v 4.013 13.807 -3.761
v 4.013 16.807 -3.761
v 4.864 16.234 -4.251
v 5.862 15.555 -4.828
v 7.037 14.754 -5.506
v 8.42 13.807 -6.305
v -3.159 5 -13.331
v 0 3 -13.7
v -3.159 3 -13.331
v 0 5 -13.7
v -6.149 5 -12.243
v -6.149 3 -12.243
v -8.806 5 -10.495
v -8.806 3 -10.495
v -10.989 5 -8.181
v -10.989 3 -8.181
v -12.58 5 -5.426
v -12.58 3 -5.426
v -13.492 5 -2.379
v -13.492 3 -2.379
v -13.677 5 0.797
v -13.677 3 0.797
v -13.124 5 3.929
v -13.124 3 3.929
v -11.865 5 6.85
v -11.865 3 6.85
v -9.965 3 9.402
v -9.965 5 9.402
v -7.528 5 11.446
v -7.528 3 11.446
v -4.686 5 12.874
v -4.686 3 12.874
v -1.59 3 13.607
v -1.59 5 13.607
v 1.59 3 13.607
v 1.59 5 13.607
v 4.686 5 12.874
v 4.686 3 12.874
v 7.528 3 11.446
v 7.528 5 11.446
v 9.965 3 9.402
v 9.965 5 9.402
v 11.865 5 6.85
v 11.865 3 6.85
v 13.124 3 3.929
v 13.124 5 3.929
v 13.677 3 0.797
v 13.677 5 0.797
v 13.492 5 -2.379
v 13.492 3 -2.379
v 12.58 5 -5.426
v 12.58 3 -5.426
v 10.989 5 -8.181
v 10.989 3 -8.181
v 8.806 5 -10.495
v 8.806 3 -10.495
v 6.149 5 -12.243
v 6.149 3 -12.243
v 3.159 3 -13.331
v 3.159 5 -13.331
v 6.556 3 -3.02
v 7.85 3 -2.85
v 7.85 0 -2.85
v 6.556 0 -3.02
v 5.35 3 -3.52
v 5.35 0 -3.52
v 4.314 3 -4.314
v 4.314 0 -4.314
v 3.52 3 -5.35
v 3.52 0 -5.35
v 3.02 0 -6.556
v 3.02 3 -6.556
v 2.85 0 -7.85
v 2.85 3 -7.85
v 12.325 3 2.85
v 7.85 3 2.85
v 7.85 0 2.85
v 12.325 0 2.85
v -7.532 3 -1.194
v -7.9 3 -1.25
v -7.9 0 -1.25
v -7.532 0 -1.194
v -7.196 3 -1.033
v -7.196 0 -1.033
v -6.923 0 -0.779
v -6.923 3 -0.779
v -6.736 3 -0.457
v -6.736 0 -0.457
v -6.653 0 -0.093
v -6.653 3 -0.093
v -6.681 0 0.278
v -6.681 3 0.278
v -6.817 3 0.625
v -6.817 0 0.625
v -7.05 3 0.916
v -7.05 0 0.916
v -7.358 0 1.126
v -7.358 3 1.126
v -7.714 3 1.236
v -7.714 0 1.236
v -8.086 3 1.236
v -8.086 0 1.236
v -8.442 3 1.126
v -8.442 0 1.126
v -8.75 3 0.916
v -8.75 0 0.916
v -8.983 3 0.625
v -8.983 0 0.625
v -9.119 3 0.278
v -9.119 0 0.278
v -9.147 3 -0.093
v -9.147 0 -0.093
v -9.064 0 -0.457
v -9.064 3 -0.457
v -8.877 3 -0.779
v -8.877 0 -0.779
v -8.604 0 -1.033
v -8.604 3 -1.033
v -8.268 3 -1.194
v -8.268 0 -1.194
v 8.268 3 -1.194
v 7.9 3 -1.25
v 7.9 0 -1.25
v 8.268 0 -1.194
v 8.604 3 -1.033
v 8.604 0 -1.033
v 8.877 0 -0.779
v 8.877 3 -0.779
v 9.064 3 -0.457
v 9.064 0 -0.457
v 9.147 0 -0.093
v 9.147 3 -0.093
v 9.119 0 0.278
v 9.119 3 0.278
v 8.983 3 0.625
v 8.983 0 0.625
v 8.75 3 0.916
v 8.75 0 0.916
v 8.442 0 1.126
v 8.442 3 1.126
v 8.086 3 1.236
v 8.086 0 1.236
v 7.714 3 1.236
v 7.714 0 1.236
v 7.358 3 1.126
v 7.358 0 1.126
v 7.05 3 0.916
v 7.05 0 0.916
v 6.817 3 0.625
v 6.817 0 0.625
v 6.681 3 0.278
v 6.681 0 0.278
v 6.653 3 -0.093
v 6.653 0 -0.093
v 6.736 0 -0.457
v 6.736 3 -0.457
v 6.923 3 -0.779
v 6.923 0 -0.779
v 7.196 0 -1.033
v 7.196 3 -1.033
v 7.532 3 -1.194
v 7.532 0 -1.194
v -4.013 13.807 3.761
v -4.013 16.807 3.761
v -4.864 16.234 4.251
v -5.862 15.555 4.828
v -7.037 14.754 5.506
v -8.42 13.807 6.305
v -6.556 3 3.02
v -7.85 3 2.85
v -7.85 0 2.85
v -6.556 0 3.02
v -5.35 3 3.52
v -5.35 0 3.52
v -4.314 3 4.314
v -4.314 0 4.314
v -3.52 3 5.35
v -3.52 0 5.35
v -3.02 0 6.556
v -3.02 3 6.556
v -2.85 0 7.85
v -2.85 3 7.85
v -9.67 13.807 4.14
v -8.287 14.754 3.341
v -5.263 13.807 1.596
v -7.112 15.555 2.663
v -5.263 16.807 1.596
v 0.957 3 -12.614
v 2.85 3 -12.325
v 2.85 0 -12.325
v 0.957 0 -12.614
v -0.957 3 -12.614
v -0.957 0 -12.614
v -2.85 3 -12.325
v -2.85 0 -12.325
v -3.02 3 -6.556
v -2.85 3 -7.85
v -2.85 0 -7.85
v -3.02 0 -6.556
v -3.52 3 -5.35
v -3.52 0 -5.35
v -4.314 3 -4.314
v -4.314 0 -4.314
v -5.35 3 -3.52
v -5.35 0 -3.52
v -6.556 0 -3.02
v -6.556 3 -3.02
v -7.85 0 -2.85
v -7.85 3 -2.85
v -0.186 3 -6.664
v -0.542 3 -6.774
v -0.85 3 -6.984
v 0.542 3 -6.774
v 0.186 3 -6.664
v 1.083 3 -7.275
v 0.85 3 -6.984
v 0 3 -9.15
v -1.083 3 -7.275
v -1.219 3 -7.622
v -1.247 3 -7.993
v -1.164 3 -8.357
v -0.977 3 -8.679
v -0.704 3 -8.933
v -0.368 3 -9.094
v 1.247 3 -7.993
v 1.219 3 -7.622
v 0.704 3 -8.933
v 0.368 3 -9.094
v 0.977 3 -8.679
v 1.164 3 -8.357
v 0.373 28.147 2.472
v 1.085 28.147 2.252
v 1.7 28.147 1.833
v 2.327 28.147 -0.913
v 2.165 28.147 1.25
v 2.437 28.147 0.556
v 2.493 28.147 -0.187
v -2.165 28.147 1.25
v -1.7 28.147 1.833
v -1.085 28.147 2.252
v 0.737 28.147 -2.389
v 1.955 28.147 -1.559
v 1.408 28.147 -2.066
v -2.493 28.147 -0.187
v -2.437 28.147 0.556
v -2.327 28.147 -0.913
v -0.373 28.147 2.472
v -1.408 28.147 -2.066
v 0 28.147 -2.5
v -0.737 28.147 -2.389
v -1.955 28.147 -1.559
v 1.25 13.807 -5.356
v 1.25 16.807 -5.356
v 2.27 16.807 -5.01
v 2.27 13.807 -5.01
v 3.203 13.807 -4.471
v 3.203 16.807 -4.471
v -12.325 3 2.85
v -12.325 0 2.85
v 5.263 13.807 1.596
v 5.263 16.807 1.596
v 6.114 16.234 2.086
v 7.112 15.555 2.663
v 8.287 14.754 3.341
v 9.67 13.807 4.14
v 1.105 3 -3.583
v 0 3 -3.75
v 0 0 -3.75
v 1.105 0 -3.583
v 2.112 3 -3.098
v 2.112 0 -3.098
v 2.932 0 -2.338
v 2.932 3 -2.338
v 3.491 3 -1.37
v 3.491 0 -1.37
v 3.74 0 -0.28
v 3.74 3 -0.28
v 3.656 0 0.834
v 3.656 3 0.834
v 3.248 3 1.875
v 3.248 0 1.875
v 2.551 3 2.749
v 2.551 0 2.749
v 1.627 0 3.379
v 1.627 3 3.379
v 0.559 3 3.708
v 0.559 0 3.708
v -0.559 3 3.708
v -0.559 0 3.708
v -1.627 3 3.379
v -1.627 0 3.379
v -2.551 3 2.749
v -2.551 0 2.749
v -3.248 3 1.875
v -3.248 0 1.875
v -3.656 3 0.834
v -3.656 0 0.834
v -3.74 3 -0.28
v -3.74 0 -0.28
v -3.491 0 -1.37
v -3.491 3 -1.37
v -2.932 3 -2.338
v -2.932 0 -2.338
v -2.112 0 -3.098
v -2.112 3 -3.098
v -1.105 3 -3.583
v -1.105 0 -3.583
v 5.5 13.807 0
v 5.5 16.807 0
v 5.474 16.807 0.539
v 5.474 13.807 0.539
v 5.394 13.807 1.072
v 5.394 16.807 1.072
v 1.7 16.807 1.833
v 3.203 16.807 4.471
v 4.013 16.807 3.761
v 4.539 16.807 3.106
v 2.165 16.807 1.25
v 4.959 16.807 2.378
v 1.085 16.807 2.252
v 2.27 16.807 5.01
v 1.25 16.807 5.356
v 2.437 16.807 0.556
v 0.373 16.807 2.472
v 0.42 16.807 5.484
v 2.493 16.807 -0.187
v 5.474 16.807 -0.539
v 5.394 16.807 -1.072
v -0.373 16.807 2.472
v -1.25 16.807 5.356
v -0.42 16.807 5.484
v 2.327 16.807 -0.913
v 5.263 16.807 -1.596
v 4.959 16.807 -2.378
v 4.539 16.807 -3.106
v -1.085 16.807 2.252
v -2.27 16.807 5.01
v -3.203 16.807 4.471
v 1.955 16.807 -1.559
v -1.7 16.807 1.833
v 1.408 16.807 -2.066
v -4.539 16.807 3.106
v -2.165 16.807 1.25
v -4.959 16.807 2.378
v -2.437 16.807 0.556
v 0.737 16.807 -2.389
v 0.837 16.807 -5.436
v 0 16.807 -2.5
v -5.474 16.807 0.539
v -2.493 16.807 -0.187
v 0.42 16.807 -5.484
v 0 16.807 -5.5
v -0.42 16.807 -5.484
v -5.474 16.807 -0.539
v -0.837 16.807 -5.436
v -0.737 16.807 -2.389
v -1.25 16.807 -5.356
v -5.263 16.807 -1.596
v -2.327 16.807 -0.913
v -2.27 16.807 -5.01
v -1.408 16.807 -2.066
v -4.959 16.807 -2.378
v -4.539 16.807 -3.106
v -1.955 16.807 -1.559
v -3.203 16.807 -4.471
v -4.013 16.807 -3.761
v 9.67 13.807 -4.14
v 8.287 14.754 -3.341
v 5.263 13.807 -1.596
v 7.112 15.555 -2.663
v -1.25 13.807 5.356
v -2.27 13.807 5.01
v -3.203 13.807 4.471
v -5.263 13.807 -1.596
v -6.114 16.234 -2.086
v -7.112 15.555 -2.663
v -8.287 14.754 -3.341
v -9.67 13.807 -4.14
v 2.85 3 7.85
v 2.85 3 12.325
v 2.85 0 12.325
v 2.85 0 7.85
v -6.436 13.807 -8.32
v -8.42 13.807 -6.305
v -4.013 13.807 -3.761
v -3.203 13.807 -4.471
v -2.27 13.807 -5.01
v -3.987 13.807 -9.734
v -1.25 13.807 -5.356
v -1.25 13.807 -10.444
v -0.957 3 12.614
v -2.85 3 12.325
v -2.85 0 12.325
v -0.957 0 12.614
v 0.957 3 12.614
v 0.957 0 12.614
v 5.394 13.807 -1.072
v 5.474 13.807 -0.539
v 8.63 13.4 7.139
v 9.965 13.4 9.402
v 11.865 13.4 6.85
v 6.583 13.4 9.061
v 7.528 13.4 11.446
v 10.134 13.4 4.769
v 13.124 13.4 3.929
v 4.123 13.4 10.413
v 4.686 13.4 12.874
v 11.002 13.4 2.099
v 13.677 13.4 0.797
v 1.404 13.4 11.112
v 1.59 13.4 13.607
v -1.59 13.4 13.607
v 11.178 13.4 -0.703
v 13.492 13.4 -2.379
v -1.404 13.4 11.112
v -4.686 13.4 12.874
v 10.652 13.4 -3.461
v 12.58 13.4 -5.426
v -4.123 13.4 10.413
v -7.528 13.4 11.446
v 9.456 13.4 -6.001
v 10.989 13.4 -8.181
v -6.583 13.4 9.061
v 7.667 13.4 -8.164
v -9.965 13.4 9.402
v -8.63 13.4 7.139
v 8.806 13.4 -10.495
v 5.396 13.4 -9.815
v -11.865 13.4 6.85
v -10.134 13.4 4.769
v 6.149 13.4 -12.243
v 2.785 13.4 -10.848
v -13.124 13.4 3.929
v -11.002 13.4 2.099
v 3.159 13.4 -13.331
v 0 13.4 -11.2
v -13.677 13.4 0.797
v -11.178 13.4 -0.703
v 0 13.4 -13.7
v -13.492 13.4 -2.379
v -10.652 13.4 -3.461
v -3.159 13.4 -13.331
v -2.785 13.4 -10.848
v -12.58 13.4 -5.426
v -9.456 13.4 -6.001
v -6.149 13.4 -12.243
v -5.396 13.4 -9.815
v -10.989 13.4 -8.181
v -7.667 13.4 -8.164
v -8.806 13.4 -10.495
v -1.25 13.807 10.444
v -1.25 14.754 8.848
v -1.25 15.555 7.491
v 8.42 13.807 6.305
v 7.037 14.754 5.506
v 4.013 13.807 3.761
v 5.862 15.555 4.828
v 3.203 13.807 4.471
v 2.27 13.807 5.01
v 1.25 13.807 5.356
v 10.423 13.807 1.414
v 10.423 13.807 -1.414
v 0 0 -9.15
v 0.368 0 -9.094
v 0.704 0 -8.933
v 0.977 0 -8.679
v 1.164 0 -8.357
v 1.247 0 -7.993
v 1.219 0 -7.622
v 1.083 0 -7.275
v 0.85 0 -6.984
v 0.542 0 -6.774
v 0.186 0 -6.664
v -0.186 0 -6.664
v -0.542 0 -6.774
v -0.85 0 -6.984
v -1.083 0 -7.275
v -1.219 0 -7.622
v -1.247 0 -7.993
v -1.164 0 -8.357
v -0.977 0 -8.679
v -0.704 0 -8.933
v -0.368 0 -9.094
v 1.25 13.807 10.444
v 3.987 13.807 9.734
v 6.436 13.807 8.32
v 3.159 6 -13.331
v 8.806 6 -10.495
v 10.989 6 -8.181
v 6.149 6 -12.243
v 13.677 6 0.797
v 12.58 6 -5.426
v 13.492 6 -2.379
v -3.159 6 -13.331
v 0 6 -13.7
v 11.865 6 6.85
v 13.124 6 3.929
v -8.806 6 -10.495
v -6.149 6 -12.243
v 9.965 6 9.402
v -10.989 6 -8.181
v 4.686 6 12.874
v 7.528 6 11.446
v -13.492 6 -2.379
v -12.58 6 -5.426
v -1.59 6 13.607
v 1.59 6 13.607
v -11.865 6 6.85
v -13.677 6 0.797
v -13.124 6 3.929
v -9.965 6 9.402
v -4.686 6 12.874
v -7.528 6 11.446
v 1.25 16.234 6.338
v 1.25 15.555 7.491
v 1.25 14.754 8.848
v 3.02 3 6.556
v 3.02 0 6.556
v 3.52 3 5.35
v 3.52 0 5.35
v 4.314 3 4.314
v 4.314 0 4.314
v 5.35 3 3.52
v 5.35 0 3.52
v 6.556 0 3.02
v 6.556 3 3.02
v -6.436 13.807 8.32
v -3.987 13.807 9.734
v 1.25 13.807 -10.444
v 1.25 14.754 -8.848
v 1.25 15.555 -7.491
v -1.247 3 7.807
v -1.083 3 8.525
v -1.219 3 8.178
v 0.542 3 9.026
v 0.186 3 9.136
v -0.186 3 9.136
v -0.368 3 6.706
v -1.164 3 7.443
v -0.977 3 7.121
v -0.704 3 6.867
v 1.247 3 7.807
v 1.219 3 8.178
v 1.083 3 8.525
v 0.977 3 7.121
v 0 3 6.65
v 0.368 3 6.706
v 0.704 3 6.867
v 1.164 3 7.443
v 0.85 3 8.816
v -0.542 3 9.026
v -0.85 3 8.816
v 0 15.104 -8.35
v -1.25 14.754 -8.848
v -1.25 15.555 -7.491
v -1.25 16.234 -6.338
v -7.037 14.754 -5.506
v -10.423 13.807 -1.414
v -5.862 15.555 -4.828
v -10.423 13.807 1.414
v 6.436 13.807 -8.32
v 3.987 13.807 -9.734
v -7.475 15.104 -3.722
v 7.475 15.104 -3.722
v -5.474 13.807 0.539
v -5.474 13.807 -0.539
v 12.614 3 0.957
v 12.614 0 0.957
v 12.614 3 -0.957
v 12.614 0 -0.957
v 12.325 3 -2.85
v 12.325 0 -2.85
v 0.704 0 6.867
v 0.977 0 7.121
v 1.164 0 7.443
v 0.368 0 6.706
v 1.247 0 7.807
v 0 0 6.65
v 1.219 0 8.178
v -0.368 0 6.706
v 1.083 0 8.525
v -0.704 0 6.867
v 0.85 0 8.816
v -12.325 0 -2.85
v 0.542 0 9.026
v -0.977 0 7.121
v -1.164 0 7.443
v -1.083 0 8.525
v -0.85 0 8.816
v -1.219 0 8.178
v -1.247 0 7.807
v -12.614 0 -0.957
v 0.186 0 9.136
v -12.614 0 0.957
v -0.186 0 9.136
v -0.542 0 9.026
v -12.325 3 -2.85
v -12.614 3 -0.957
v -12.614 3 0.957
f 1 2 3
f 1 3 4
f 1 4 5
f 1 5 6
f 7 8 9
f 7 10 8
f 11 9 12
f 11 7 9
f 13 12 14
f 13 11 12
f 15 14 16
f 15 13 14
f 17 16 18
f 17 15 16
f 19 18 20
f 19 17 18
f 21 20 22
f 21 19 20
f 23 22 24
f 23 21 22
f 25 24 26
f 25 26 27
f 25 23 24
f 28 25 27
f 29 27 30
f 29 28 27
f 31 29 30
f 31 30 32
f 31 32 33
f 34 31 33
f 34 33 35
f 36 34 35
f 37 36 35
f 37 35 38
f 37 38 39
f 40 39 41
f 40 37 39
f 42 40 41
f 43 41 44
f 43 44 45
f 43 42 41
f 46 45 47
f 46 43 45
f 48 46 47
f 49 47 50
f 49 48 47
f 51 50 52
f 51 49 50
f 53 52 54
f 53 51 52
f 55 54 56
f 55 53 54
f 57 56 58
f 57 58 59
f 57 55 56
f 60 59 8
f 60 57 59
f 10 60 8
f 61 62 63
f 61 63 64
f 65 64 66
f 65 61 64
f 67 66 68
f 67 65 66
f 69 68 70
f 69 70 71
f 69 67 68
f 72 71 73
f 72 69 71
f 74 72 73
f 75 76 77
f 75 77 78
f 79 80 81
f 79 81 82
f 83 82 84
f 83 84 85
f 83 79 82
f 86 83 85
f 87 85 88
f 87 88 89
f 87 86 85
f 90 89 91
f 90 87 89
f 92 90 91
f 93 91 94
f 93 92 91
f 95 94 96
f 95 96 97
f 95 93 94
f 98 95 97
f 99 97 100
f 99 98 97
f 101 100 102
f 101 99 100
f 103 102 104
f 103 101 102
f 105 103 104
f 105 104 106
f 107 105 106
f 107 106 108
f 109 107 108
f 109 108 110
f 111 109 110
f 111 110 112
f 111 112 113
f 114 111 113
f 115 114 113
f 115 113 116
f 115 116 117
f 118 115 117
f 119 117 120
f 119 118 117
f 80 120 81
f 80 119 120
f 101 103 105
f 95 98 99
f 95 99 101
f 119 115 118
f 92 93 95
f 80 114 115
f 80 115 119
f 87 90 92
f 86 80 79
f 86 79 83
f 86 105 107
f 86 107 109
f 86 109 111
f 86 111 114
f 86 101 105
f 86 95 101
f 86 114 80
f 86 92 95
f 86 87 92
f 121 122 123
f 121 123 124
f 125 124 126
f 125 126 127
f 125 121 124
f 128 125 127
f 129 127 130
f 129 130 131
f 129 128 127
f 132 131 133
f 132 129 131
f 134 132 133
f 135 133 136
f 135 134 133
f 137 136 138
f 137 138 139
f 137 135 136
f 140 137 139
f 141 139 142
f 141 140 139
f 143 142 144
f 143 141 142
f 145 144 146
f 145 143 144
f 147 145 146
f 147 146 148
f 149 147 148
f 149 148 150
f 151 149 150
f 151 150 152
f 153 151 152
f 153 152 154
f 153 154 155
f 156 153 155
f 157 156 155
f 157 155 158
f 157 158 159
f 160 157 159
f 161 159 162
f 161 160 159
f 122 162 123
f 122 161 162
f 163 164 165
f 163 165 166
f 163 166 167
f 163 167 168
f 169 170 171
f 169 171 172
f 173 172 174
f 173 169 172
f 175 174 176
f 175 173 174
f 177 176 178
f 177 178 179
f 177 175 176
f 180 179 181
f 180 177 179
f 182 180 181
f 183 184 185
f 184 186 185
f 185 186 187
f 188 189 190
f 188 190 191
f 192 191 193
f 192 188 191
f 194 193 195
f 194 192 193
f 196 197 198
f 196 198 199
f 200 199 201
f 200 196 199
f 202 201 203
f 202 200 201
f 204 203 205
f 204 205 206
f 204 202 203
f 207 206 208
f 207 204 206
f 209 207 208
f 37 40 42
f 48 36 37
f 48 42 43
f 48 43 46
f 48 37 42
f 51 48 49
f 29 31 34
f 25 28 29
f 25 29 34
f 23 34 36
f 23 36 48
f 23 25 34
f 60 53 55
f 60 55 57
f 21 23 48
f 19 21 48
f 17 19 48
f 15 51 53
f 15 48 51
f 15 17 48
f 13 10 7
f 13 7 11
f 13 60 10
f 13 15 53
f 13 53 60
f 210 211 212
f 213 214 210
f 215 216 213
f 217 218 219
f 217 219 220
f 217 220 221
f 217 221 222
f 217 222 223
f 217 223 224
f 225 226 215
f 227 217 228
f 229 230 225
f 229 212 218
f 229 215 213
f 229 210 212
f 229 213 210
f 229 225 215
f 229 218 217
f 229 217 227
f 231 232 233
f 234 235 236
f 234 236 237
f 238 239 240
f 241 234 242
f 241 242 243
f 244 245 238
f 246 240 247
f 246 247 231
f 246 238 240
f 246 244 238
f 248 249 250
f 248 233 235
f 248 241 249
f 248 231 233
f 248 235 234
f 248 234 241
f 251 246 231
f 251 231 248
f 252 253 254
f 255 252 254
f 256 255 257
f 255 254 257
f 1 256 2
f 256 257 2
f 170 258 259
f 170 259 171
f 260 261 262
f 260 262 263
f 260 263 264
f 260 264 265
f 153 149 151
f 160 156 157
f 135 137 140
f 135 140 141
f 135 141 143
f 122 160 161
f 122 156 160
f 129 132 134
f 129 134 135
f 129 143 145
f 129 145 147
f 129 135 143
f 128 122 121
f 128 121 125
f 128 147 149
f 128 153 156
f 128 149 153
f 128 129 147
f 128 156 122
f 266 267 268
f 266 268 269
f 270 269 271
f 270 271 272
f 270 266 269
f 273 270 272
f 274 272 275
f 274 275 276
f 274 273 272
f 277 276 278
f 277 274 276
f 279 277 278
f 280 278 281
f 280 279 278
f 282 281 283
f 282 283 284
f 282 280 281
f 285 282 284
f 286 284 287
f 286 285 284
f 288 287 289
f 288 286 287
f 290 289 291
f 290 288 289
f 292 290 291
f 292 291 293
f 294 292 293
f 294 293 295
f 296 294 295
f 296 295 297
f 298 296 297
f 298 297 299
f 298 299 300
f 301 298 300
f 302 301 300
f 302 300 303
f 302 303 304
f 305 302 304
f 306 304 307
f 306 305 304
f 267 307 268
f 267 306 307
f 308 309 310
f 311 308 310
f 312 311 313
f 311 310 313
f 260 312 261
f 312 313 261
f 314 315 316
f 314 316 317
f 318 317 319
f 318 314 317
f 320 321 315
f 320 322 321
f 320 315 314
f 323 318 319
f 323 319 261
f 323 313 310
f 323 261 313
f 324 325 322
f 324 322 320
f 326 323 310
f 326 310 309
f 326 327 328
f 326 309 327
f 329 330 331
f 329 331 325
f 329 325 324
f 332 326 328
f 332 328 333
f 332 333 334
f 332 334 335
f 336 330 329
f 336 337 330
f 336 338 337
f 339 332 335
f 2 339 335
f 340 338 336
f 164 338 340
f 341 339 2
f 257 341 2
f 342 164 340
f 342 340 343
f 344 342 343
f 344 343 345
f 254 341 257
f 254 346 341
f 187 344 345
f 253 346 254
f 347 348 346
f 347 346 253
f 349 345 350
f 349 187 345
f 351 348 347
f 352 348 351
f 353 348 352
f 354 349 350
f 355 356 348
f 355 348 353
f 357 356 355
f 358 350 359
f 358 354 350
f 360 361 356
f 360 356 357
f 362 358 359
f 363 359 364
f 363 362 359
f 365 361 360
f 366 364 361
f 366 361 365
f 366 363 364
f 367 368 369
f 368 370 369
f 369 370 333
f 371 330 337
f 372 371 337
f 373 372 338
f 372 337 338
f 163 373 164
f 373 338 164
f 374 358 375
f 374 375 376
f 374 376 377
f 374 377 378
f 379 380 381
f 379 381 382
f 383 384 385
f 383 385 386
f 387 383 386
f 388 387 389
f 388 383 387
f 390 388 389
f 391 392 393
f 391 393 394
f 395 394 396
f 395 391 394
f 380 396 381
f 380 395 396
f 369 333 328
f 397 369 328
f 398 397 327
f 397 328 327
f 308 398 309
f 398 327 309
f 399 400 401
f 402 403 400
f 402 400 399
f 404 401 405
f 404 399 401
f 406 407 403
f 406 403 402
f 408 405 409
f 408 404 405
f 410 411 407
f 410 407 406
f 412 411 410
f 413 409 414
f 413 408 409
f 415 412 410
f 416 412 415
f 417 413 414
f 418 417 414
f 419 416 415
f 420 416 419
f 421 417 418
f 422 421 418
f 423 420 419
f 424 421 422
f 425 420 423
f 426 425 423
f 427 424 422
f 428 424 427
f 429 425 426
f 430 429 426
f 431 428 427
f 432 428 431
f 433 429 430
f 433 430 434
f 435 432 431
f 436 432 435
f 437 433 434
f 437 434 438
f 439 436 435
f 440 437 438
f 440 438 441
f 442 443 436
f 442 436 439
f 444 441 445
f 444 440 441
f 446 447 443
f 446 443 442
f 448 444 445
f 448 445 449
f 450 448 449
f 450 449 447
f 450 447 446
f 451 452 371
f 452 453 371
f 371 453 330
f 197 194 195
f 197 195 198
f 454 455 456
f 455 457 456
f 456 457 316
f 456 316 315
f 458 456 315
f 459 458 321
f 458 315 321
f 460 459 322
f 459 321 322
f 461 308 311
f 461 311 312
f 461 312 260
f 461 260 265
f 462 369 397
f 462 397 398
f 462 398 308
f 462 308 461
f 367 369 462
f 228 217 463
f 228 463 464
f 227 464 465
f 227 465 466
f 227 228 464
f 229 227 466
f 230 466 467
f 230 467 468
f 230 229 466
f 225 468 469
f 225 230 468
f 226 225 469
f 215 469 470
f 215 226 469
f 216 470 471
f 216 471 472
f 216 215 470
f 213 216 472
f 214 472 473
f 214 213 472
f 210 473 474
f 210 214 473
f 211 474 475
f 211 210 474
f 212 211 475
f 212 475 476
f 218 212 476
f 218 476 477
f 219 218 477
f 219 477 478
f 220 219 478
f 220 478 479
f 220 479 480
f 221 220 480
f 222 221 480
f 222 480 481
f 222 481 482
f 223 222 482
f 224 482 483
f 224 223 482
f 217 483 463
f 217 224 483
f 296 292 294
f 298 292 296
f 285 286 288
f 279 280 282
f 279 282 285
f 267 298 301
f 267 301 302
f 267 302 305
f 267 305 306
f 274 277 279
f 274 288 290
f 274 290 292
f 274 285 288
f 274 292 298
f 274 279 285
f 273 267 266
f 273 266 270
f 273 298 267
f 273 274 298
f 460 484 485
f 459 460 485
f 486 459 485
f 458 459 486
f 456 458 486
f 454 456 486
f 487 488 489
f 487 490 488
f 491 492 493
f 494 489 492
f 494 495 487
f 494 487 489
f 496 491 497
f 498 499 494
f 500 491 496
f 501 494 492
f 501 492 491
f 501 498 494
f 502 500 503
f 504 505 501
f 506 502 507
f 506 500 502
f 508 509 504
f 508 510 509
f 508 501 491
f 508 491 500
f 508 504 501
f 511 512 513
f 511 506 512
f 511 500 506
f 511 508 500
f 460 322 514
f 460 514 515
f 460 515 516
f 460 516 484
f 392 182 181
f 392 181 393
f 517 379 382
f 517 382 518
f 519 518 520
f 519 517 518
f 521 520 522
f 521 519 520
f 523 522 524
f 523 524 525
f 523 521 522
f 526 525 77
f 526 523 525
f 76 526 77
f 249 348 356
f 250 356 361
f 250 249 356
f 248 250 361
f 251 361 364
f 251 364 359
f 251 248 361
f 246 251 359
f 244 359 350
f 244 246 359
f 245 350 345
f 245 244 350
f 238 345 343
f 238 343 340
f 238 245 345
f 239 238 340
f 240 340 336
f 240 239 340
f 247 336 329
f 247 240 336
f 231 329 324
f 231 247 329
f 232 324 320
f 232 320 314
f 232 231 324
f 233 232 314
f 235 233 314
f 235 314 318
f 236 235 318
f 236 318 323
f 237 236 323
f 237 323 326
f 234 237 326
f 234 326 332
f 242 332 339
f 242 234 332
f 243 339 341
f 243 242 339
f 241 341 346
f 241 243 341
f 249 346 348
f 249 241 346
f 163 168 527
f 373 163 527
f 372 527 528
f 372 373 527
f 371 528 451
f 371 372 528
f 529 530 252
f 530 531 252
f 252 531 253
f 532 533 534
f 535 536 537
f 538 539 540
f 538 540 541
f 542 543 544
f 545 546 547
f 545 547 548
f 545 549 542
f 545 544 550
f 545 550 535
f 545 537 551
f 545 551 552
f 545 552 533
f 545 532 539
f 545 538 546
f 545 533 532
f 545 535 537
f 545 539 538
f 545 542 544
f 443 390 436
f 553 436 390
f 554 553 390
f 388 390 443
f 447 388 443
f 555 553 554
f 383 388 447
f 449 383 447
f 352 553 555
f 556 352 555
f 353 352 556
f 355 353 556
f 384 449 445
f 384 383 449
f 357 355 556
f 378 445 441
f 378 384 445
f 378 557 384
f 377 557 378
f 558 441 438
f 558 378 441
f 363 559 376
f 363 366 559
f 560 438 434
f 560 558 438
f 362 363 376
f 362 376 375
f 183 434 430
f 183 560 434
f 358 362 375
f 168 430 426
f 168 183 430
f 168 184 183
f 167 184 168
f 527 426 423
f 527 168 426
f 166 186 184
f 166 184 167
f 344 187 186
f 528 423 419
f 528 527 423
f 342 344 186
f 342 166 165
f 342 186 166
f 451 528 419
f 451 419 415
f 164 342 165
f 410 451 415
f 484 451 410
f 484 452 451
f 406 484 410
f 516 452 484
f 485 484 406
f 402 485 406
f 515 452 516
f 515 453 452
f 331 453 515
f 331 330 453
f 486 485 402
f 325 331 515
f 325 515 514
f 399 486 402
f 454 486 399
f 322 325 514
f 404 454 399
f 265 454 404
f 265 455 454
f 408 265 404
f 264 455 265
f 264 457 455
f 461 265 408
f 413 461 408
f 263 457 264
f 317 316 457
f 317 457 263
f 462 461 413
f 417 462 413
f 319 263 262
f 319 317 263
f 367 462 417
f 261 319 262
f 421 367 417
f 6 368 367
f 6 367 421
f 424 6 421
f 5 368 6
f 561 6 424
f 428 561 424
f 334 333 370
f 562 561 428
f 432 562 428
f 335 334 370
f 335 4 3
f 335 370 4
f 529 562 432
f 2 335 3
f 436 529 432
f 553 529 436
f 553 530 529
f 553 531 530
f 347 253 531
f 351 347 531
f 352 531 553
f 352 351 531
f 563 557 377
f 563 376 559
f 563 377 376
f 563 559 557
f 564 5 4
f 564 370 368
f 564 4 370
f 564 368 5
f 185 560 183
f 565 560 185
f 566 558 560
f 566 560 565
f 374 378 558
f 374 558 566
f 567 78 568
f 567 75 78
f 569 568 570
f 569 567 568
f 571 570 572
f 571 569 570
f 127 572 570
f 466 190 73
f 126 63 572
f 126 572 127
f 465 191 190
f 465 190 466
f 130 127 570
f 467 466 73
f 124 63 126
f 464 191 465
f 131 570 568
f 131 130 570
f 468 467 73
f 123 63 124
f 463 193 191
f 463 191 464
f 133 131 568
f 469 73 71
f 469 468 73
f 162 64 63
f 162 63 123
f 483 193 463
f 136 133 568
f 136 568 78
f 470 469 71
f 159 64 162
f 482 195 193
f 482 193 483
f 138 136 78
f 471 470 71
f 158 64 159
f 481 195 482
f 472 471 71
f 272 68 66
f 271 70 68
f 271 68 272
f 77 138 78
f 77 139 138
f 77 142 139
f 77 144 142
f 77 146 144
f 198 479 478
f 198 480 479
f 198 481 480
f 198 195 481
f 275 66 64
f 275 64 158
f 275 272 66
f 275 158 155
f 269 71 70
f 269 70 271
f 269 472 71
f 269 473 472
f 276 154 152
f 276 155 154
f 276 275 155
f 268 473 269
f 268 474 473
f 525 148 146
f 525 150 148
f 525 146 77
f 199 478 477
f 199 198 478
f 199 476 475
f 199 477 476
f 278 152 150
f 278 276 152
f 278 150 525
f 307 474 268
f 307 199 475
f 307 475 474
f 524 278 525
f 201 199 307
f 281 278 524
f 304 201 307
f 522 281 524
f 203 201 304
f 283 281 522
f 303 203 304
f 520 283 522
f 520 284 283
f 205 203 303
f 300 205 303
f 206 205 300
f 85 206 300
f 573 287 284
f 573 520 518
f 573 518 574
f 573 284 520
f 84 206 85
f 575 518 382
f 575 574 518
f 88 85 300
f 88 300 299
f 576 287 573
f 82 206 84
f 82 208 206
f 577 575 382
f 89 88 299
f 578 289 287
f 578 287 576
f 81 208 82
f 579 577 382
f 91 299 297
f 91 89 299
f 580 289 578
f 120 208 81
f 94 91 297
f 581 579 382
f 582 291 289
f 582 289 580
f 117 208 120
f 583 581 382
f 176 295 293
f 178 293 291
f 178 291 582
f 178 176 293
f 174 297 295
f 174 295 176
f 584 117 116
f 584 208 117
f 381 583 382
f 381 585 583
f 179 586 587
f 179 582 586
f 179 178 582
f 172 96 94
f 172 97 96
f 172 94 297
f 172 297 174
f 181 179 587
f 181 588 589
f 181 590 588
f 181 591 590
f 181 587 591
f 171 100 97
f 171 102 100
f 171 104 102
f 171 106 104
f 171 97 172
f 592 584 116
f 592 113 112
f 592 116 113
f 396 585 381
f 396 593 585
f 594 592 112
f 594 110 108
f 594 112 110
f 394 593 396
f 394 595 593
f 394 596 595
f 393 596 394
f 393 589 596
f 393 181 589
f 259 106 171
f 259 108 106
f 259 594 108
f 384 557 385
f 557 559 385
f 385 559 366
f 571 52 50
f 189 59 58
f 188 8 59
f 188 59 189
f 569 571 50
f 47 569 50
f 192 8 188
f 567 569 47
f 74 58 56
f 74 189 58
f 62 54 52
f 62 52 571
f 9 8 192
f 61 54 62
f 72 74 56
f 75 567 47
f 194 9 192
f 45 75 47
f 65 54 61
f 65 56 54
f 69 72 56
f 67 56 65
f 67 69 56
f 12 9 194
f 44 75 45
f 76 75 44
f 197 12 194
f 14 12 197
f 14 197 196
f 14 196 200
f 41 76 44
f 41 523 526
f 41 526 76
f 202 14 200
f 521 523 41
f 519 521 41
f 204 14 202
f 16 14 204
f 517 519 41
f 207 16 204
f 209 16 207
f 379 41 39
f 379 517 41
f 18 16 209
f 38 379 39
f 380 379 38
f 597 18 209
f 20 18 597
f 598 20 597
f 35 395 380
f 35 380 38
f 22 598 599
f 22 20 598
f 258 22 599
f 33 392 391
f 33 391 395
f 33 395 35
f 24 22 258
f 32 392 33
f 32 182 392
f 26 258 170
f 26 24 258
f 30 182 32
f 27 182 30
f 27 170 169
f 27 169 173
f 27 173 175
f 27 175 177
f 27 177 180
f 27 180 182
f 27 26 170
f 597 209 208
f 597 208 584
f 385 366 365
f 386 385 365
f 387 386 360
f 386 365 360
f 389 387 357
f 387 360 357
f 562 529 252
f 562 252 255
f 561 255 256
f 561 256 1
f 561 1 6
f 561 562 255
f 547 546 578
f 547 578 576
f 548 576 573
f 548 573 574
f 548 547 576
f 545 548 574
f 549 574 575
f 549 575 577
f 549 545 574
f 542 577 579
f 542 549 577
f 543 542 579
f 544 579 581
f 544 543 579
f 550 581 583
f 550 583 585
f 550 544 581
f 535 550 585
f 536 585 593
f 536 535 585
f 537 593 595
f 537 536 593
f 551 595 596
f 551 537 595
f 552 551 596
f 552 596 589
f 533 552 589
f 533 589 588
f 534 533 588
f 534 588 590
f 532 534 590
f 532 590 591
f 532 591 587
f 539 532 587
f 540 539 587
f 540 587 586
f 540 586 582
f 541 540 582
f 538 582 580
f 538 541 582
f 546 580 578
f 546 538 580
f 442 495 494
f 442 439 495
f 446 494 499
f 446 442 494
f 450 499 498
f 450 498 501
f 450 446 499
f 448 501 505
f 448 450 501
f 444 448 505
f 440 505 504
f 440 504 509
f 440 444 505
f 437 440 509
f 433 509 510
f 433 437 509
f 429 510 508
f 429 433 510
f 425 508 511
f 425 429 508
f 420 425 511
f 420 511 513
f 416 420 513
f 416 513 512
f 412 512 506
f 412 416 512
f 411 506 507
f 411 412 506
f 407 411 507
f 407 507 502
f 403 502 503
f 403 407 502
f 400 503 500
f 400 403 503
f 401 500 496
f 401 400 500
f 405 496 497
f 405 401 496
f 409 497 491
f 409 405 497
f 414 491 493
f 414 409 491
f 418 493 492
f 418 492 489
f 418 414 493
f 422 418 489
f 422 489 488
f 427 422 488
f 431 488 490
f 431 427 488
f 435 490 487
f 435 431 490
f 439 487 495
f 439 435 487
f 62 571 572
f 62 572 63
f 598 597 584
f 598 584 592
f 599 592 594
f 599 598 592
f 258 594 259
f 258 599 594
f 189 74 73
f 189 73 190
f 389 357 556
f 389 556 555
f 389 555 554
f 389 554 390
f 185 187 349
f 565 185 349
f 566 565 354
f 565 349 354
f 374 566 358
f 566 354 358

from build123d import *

# Parameters (mm, degrees)
CORTAR_EXTRUIR1_START = -3
CROQUIS2_R            = 3.75
CROQUIS2_R_2          = 1.25
CORTAR_EXTRUIR1_DEPTH = 3
CORTAR_EXTRUIR2_DEPTH = 3


with BuildPart() as part:
    # Croquis1 → Revolución1 (revolve)
    with BuildSketch(Plane.XY, mode=Mode.PRIVATE) as revoluci_n1_sk:
        Polygon((0, 0), (-12.65, 0), (-12.65, 3), (-13.7, 3), (-13.7, 5), (0, 5), align=None)
        Polygon((0, 28.147269), (0, 6), (-13.7, 6), (-13.7, 13.4), (-11.2, 13.4), (-5.5, 16.807269), (-2.5, 16.807269), (-2.5, 28.147269), align=None)
    revolve(revoluci_n1_sk.sketch.rotate(Axis((0, 0, 0), (0, 1, 0)), 270), axis=Axis((0, 0, 0), (0, 1, 0)))

    # Croquis2 → Cortar-Extruir1 (cut)
    with BuildSketch(Plane.XZ.offset(CORTAR_EXTRUIR1_START)):
        with BuildLine():
            ThreePointArc((-2.85, -7.85), (-4.314466094, -4.314466094), (-7.85, -2.85))
            Line((-7.85, -2.85), (-12.324771803, -2.85))
            ThreePointArc((-12.324771803, -2.85), (-8.944900782, -8.944900782), (-2.85, -12.324771803))
            Line((-2.85, -12.324771803), (-2.85, -7.85))
        make_face()
        with BuildLine():
            ThreePointArc((-2.85, 12.324771803), (-8.944900782, 8.944900782), (-12.324771803, 2.85))
            Line((-12.324771803, 2.85), (-7.85, 2.85))
            ThreePointArc((-7.85, 2.85), (-4.314466094, 4.314466094), (-2.85, 7.85))
            Line((-2.85, 7.85), (-2.85, 12.324771803))
        make_face()
        with BuildLine():
            ThreePointArc((12.324771803, 2.85), (8.944900782, 8.944900782), (2.85, 12.324771803))
            Line((2.85, 12.324771803), (2.85, 7.85))
            ThreePointArc((2.85, 7.85), (4.314466094, 4.314466094), (7.85, 2.85))
            Line((7.85, 2.85), (12.324771803, 2.85))
        make_face()
        with BuildLine():
            Line((2.85, -7.85), (2.85, -12.324771803))
            ThreePointArc((2.85, -12.324771803), (8.944900782, -8.944900782), (12.324771803, -2.85))
            Line((12.324771803, -2.85), (7.85, -2.85))
            ThreePointArc((7.85, -2.85), (4.314466094, -4.314466094), (2.85, -7.85))
        make_face()
        with Locations(Location((0, 0, 0), (0, 0, 270))):
            Circle(CROQUIS2_R)
        with Locations(Location((0, -7.9, 0), (0, 0, 270))):
            Circle(CROQUIS2_R_2)
        with Locations(Location((7.9, 0, 0), (0, 0, 270))):
            Circle(CROQUIS2_R_2)
        with Locations(Location((0, 7.9, 0), (0, 0, 270))):
            Circle(CROQUIS2_R_2)
        with Locations(Location((-7.9, 0, 0), (0, 0, 270))):
            Circle(CROQUIS2_R_2)
    extrude(amount=CORTAR_EXTRUIR1_DEPTH, mode=Mode.SUBTRACT)

    # Croquis3 → Cortar-Extruir2 (cut)
    with BuildSketch(Plane(origin=(0, 16.807269, 0), x_dir=(1, 0, 0), z_dir=(0, 1, 0))):
        with BuildLine():
            ThreePointArc((-5.263493829, -1.595503906), (-5.5, 0), (-5.263493829, 1.595503906))
            Line((-5.263493829, 1.595503906), (-10.263886087, 4.482481722))
            ThreePointArc((-10.263886087, 4.482481722), (-11.2, 0), (-10.263886087, -4.482481722))
            Line((-10.263886087, -4.482481722), (-5.263493829, -1.595503906))
        make_face()
        with BuildLine():
            ThreePointArc((-1.25, 11.130026954), (-5.6, 9.699484522), (-9.013886087, 6.647545232))
            Line((-9.013886087, 6.647545232), (-4.013493829, 3.760567415))
            ThreePointArc((-4.013493829, 3.760567415), (-2.75, 4.763139721), (-1.25, 5.356071321))
            Line((-1.25, 5.356071321), (-1.25, 11.130026954))
        make_face()
        with BuildLine():
            Line((1.25, 11.130026954), (1.25, 5.356071321))
            ThreePointArc((1.25, 5.356071321), (2.75, 4.763139721), (4.013493829, 3.760567415))
            Line((4.013493829, 3.760567415), (9.013886087, 6.647545232))
            ThreePointArc((9.013886087, 6.647545232), (5.6, 9.699484522), (1.25, 11.130026954))
        make_face()
        with BuildLine():
            Line((10.263886087, 4.482481722), (5.263493829, 1.595503906))
            ThreePointArc((5.263493829, 1.595503906), (5.440552181, 0.806468828), (5.5, 0))
            ThreePointArc((5.5, 0), (5.440552181, -0.806468828), (5.263493829, -1.595503906))
            Line((5.263493829, -1.595503906), (10.263886087, -4.482481722))
            ThreePointArc((10.263886087, -4.482481722), (11.2, 0), (10.263886087, 4.482481722))
        make_face()
        with BuildLine():
            ThreePointArc((4.013493829, -3.760567415), (2.75, -4.763139721), (1.25, -5.356071321))
            Line((1.25, -5.356071321), (1.25, -11.130026954))
            ThreePointArc((1.25, -11.130026954), (5.6, -9.699484522), (9.013886087, -6.647545232))
            Line((9.013886087, -6.647545232), (4.013493829, -3.760567415))
        make_face()
        with BuildLine():
            ThreePointArc((-1.25, -5.356071321), (-2.75, -4.763139721), (-4.013493829, -3.760567415))
            Line((-4.013493829, -3.760567415), (-9.013886087, -6.647545232))
            ThreePointArc((-9.013886087, -6.647545232), (-5.6, -9.699484522), (-1.25, -11.130026954))
            Line((-1.25, -11.130026954), (-1.25, -5.356071321))
        make_face()
    extrude(amount=-CORTAR_EXTRUIR2_DEPTH, mode=Mode.SUBTRACT)


solid = part.part
